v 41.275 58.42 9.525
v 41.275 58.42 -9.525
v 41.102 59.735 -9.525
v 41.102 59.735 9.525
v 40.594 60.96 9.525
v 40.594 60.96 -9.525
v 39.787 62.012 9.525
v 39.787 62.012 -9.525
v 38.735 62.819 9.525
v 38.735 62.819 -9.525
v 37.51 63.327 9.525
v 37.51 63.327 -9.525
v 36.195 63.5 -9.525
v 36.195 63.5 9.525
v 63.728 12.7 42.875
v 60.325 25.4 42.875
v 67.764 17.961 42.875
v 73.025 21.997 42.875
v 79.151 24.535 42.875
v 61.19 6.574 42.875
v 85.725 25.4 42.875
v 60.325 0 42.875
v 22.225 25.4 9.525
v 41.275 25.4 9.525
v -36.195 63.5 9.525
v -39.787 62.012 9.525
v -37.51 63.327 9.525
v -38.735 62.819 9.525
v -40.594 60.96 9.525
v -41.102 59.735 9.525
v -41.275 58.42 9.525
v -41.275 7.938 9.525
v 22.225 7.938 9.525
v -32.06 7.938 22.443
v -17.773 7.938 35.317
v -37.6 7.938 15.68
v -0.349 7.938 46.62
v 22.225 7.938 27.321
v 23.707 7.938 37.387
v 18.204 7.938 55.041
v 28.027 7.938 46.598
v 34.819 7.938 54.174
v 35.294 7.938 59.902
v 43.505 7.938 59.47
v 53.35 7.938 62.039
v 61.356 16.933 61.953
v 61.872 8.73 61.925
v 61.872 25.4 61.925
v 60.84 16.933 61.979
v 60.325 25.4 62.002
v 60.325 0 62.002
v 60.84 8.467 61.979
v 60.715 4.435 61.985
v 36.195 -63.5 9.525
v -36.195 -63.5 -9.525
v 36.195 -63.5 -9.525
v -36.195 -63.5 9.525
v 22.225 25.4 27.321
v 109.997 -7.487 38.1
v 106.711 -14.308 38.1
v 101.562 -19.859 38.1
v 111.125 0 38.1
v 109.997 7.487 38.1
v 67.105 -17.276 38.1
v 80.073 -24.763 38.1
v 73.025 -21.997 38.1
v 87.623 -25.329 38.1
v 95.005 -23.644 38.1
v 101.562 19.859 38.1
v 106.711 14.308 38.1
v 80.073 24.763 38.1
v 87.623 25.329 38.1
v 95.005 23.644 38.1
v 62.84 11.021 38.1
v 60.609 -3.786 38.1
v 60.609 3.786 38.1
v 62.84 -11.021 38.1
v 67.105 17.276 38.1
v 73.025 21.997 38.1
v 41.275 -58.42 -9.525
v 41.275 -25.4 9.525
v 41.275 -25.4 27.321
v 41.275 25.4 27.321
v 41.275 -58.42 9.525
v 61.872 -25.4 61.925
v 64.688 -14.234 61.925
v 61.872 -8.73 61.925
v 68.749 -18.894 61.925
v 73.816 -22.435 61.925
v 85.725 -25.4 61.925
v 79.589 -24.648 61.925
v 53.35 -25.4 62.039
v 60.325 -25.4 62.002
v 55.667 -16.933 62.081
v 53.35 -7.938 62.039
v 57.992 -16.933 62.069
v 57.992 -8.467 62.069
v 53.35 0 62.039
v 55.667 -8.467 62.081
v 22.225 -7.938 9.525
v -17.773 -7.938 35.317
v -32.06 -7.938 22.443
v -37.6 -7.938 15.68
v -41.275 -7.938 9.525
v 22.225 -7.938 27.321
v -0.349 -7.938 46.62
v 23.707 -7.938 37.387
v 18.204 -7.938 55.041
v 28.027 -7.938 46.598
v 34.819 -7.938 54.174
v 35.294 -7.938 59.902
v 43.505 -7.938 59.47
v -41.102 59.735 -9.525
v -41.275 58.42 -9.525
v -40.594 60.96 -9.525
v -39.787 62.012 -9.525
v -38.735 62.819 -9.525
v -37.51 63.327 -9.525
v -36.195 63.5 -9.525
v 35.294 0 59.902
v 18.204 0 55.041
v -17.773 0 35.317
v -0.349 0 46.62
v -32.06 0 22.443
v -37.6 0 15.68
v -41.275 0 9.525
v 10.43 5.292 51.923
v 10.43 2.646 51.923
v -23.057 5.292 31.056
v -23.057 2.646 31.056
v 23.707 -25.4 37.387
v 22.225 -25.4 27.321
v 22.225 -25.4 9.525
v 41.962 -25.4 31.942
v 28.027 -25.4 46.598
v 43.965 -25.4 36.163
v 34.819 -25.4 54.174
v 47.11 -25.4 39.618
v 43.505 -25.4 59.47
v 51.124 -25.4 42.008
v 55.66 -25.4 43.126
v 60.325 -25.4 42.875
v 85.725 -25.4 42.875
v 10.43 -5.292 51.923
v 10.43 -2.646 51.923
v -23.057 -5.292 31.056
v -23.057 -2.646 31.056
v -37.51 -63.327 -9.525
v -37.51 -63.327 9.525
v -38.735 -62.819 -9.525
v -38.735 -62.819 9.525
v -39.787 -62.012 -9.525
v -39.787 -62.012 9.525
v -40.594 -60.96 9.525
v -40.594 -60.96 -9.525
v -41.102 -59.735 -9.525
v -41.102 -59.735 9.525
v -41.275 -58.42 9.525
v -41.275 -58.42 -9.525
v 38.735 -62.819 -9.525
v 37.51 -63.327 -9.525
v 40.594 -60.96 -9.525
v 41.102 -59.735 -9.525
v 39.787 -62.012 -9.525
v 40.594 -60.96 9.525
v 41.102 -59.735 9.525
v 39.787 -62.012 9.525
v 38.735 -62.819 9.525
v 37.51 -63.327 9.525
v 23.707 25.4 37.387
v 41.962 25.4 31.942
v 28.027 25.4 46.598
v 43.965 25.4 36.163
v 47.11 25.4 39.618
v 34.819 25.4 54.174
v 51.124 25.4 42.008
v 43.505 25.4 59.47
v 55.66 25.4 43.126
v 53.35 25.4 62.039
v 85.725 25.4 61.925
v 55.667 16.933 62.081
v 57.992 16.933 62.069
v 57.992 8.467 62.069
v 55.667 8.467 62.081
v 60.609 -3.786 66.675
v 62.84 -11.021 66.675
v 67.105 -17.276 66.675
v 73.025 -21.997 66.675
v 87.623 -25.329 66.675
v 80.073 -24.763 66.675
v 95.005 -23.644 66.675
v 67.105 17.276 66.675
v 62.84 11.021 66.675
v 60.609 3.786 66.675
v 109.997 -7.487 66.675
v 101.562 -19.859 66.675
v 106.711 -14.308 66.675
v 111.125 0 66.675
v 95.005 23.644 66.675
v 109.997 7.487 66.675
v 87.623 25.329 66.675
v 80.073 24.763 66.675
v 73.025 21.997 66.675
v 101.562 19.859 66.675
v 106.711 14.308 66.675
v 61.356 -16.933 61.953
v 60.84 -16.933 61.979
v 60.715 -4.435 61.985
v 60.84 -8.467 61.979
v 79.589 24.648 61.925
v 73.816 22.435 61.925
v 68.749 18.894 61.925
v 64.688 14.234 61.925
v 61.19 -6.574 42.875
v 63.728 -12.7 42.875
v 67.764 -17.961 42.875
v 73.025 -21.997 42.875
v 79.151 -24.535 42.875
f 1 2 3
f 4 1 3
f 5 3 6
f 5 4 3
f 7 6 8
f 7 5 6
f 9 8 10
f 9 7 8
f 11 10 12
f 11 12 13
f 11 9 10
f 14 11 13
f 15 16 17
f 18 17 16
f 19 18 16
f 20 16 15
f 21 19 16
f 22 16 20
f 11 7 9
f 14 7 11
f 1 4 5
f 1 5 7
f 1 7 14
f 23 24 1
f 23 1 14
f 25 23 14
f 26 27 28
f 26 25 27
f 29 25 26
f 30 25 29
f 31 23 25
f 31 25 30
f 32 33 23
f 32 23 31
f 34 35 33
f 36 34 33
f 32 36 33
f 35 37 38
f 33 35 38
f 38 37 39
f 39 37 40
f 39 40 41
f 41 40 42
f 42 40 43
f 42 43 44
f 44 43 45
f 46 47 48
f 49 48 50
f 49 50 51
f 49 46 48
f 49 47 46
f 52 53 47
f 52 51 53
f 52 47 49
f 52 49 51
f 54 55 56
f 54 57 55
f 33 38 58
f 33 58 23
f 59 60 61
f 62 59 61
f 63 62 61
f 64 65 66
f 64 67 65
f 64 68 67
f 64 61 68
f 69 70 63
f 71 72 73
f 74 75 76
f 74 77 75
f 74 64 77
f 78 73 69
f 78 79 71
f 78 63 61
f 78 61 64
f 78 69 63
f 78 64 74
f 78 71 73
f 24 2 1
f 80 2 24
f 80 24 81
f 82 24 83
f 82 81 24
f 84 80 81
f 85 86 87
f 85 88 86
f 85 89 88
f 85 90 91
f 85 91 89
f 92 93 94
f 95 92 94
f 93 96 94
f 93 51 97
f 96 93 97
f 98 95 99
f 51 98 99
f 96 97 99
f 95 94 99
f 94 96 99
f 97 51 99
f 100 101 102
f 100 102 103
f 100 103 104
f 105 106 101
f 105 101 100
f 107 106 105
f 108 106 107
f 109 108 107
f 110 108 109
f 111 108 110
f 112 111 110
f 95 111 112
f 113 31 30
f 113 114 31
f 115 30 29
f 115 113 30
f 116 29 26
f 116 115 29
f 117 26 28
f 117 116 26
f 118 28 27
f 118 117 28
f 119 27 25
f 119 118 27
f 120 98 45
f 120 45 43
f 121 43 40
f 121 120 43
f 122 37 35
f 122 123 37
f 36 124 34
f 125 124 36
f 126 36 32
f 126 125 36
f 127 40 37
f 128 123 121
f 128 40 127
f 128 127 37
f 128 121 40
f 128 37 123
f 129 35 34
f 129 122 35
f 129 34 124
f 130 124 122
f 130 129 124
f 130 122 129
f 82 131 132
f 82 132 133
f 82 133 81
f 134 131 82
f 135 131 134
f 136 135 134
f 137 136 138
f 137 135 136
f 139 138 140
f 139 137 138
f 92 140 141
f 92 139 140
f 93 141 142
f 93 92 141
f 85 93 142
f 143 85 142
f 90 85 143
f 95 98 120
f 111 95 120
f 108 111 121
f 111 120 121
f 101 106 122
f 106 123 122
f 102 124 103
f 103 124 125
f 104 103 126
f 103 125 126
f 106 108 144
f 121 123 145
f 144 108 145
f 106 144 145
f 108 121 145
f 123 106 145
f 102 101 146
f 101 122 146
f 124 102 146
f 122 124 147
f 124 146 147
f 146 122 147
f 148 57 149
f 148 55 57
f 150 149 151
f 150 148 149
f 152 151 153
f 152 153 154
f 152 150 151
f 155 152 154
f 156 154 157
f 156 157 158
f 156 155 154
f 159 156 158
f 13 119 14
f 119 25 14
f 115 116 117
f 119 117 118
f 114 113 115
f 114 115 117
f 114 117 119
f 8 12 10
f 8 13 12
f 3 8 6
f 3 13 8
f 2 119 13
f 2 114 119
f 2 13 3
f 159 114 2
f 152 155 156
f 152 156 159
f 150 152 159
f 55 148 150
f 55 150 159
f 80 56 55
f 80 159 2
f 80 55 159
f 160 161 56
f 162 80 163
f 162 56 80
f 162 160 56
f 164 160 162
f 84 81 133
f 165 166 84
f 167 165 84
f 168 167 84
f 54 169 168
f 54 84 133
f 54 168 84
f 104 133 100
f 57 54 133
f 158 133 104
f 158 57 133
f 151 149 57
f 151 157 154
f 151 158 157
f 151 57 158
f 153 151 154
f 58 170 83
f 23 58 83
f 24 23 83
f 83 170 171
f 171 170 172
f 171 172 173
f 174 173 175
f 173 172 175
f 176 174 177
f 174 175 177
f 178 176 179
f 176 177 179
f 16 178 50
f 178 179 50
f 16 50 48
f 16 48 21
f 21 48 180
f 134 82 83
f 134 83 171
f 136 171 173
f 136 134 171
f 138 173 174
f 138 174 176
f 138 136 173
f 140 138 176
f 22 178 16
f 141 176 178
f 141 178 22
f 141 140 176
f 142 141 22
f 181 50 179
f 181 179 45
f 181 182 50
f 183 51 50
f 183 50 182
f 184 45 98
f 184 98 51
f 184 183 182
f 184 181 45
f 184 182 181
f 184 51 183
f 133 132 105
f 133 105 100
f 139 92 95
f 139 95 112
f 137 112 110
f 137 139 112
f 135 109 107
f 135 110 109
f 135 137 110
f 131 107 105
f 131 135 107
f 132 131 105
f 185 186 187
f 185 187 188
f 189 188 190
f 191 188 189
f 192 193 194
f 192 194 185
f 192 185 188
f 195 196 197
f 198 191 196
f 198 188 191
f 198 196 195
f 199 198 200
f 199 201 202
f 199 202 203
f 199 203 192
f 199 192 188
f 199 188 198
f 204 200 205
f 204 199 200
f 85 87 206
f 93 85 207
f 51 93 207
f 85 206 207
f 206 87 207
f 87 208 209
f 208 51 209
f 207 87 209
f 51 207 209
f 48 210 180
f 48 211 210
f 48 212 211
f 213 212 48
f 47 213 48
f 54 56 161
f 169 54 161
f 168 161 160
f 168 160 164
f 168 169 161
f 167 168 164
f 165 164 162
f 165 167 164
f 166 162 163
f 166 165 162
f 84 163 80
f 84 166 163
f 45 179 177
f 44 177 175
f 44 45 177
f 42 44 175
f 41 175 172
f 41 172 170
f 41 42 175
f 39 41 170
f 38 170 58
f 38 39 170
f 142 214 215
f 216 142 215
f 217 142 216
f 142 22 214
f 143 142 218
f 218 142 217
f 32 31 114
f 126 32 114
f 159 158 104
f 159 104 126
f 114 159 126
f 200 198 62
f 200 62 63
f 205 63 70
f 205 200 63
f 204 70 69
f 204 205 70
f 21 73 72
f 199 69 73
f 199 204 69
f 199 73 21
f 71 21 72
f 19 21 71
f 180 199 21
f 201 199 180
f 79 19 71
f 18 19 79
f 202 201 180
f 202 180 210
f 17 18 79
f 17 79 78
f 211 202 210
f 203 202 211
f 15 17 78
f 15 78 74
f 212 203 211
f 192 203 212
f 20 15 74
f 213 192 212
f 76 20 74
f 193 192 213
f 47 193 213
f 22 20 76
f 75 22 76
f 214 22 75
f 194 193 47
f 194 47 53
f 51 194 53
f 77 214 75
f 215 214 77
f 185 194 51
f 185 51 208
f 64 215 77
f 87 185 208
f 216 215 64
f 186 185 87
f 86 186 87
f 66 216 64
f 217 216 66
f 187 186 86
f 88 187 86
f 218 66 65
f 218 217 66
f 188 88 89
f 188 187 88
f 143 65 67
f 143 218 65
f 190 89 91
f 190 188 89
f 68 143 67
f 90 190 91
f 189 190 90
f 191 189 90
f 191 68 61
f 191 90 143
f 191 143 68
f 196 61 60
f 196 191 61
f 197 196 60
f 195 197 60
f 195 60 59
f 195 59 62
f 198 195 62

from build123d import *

# Parameters (mm, degrees)
F1_DEPTH = 63.5
F2_DEPTH = 25.4
F3_DEPTH = 25.4
F4_DEPTH = 7.9375
F6_R     = 5.08
F7_R     = 5.08


with BuildPart() as f1:
    # F0 (on Front) → F1 (new body, symmetric)
    with BuildSketch(Plane.XZ):
        Polygon((-41.275, 9.525), (-41.275, -9.525), (41.275, -9.525), (41.275, 9.525), (22.225, 9.525), align=None)
    extrude(amount=F1_DEPTH, both=True)

    # F0 (on Front) → F2 (join, symmetric)
    with BuildSketch(Plane.XZ):
        with BuildLine():
            Line((22.225, 9.525), (41.275, 9.525))
            Line((41.275, 9.525), (41.275, 27.32094))
            ThreePointArc((41.275, 27.32094), (47.109768, 39.617662), (60.325, 42.8752))
            Line((60.325, 42.8752), (60.325, 62.001544))
            add(Edge.make_bspline(
                [(60.325, 62.001544), (57.988427, 62.097884), (55.662261, 62.10827), (53.349908, 62.038586)],
                knots=[1.216171, 1.216171, 1.216171, 1.216171, 6.730793, 6.730793, 6.730793, 6.730793], degree=3))
            ThreePointArc((53.349908, 62.038586), (31.145444, 50.634428), (22.225, 27.32094))
            Line((22.225, 27.32094), (22.225, 9.525))
        make_face()
    extrude(amount=F2_DEPTH, both=True)

    # F0 (on Front) → F3 (join, symmetric)
    with BuildSketch(Plane.XZ):
        with BuildLine():
            add(Edge.make_bspline(
                [(61.872375, 61.9252), (61.356101, 61.954871), (60.840298, 61.980297), (60.325, 62.001544)],
                knots=[0, 0, 0, 0, 1.216171, 1.216171, 1.216171, 1.216171], degree=3))
            Line((60.325, 62.001544), (60.325, 42.8752))
            Line((60.325, 42.8752), (85.725, 42.8752))
            Line((85.725, 42.8752), (85.725, 61.9252))
            Line((85.725, 61.9252), (61.872375, 61.9252))
        make_face()
    extrude(amount=F3_DEPTH, both=True)

    # F0 (on Front) → F4 (join, symmetric)
    with BuildSketch(Plane.XZ):
        with BuildLine():
            add(Edge.make_bspline(
                [(53.349908, 62.038586), (7.6601, 60.6617), (-32.637096, 28.024181), (-41.275, 9.525)],
                knots=[6.730793, 6.730793, 6.730793, 6.730793, 115.69426, 115.69426, 115.69426, 115.69426], degree=3))
            Line((-41.275, 9.525), (22.225, 9.525))
            Line((22.225, 9.525), (22.225, 27.32094))
            ThreePointArc((22.225, 27.32094), (31.145444, 50.634428), (53.349908, 62.038586))
        make_face()
    extrude(amount=F4_DEPTH, both=True)

    # F0 (on Front) → F5 (revolve)
    with BuildSketch(Plane.XZ):
        Polygon((85.725, 61.9252), (85.725, 42.8752), (85.725, 38.1), (111.125, 38.1), (111.125, 66.675), (85.725, 66.675), align=None)
    revolve(axis=Axis((85.725, 0, 52.3875), (0, 0, 1)))

    # F6
    f6_edges = [f1.edges().sort_by_distance(p)[0] for p in [
        (-41.275, 63.5, 0),
        (41.275, 63.5, 0),
        (-41.275, -63.5, 0),
    ]]
    fillet(f6_edges, radius=F6_R)

    # F7
    f7_edges = [f1.edges().sort_by_distance(p)[0] for p in [
        (41.275, -63.5, 0),
    ]]
    fillet(f7_edges, radius=F7_R)


solid = f1.part
